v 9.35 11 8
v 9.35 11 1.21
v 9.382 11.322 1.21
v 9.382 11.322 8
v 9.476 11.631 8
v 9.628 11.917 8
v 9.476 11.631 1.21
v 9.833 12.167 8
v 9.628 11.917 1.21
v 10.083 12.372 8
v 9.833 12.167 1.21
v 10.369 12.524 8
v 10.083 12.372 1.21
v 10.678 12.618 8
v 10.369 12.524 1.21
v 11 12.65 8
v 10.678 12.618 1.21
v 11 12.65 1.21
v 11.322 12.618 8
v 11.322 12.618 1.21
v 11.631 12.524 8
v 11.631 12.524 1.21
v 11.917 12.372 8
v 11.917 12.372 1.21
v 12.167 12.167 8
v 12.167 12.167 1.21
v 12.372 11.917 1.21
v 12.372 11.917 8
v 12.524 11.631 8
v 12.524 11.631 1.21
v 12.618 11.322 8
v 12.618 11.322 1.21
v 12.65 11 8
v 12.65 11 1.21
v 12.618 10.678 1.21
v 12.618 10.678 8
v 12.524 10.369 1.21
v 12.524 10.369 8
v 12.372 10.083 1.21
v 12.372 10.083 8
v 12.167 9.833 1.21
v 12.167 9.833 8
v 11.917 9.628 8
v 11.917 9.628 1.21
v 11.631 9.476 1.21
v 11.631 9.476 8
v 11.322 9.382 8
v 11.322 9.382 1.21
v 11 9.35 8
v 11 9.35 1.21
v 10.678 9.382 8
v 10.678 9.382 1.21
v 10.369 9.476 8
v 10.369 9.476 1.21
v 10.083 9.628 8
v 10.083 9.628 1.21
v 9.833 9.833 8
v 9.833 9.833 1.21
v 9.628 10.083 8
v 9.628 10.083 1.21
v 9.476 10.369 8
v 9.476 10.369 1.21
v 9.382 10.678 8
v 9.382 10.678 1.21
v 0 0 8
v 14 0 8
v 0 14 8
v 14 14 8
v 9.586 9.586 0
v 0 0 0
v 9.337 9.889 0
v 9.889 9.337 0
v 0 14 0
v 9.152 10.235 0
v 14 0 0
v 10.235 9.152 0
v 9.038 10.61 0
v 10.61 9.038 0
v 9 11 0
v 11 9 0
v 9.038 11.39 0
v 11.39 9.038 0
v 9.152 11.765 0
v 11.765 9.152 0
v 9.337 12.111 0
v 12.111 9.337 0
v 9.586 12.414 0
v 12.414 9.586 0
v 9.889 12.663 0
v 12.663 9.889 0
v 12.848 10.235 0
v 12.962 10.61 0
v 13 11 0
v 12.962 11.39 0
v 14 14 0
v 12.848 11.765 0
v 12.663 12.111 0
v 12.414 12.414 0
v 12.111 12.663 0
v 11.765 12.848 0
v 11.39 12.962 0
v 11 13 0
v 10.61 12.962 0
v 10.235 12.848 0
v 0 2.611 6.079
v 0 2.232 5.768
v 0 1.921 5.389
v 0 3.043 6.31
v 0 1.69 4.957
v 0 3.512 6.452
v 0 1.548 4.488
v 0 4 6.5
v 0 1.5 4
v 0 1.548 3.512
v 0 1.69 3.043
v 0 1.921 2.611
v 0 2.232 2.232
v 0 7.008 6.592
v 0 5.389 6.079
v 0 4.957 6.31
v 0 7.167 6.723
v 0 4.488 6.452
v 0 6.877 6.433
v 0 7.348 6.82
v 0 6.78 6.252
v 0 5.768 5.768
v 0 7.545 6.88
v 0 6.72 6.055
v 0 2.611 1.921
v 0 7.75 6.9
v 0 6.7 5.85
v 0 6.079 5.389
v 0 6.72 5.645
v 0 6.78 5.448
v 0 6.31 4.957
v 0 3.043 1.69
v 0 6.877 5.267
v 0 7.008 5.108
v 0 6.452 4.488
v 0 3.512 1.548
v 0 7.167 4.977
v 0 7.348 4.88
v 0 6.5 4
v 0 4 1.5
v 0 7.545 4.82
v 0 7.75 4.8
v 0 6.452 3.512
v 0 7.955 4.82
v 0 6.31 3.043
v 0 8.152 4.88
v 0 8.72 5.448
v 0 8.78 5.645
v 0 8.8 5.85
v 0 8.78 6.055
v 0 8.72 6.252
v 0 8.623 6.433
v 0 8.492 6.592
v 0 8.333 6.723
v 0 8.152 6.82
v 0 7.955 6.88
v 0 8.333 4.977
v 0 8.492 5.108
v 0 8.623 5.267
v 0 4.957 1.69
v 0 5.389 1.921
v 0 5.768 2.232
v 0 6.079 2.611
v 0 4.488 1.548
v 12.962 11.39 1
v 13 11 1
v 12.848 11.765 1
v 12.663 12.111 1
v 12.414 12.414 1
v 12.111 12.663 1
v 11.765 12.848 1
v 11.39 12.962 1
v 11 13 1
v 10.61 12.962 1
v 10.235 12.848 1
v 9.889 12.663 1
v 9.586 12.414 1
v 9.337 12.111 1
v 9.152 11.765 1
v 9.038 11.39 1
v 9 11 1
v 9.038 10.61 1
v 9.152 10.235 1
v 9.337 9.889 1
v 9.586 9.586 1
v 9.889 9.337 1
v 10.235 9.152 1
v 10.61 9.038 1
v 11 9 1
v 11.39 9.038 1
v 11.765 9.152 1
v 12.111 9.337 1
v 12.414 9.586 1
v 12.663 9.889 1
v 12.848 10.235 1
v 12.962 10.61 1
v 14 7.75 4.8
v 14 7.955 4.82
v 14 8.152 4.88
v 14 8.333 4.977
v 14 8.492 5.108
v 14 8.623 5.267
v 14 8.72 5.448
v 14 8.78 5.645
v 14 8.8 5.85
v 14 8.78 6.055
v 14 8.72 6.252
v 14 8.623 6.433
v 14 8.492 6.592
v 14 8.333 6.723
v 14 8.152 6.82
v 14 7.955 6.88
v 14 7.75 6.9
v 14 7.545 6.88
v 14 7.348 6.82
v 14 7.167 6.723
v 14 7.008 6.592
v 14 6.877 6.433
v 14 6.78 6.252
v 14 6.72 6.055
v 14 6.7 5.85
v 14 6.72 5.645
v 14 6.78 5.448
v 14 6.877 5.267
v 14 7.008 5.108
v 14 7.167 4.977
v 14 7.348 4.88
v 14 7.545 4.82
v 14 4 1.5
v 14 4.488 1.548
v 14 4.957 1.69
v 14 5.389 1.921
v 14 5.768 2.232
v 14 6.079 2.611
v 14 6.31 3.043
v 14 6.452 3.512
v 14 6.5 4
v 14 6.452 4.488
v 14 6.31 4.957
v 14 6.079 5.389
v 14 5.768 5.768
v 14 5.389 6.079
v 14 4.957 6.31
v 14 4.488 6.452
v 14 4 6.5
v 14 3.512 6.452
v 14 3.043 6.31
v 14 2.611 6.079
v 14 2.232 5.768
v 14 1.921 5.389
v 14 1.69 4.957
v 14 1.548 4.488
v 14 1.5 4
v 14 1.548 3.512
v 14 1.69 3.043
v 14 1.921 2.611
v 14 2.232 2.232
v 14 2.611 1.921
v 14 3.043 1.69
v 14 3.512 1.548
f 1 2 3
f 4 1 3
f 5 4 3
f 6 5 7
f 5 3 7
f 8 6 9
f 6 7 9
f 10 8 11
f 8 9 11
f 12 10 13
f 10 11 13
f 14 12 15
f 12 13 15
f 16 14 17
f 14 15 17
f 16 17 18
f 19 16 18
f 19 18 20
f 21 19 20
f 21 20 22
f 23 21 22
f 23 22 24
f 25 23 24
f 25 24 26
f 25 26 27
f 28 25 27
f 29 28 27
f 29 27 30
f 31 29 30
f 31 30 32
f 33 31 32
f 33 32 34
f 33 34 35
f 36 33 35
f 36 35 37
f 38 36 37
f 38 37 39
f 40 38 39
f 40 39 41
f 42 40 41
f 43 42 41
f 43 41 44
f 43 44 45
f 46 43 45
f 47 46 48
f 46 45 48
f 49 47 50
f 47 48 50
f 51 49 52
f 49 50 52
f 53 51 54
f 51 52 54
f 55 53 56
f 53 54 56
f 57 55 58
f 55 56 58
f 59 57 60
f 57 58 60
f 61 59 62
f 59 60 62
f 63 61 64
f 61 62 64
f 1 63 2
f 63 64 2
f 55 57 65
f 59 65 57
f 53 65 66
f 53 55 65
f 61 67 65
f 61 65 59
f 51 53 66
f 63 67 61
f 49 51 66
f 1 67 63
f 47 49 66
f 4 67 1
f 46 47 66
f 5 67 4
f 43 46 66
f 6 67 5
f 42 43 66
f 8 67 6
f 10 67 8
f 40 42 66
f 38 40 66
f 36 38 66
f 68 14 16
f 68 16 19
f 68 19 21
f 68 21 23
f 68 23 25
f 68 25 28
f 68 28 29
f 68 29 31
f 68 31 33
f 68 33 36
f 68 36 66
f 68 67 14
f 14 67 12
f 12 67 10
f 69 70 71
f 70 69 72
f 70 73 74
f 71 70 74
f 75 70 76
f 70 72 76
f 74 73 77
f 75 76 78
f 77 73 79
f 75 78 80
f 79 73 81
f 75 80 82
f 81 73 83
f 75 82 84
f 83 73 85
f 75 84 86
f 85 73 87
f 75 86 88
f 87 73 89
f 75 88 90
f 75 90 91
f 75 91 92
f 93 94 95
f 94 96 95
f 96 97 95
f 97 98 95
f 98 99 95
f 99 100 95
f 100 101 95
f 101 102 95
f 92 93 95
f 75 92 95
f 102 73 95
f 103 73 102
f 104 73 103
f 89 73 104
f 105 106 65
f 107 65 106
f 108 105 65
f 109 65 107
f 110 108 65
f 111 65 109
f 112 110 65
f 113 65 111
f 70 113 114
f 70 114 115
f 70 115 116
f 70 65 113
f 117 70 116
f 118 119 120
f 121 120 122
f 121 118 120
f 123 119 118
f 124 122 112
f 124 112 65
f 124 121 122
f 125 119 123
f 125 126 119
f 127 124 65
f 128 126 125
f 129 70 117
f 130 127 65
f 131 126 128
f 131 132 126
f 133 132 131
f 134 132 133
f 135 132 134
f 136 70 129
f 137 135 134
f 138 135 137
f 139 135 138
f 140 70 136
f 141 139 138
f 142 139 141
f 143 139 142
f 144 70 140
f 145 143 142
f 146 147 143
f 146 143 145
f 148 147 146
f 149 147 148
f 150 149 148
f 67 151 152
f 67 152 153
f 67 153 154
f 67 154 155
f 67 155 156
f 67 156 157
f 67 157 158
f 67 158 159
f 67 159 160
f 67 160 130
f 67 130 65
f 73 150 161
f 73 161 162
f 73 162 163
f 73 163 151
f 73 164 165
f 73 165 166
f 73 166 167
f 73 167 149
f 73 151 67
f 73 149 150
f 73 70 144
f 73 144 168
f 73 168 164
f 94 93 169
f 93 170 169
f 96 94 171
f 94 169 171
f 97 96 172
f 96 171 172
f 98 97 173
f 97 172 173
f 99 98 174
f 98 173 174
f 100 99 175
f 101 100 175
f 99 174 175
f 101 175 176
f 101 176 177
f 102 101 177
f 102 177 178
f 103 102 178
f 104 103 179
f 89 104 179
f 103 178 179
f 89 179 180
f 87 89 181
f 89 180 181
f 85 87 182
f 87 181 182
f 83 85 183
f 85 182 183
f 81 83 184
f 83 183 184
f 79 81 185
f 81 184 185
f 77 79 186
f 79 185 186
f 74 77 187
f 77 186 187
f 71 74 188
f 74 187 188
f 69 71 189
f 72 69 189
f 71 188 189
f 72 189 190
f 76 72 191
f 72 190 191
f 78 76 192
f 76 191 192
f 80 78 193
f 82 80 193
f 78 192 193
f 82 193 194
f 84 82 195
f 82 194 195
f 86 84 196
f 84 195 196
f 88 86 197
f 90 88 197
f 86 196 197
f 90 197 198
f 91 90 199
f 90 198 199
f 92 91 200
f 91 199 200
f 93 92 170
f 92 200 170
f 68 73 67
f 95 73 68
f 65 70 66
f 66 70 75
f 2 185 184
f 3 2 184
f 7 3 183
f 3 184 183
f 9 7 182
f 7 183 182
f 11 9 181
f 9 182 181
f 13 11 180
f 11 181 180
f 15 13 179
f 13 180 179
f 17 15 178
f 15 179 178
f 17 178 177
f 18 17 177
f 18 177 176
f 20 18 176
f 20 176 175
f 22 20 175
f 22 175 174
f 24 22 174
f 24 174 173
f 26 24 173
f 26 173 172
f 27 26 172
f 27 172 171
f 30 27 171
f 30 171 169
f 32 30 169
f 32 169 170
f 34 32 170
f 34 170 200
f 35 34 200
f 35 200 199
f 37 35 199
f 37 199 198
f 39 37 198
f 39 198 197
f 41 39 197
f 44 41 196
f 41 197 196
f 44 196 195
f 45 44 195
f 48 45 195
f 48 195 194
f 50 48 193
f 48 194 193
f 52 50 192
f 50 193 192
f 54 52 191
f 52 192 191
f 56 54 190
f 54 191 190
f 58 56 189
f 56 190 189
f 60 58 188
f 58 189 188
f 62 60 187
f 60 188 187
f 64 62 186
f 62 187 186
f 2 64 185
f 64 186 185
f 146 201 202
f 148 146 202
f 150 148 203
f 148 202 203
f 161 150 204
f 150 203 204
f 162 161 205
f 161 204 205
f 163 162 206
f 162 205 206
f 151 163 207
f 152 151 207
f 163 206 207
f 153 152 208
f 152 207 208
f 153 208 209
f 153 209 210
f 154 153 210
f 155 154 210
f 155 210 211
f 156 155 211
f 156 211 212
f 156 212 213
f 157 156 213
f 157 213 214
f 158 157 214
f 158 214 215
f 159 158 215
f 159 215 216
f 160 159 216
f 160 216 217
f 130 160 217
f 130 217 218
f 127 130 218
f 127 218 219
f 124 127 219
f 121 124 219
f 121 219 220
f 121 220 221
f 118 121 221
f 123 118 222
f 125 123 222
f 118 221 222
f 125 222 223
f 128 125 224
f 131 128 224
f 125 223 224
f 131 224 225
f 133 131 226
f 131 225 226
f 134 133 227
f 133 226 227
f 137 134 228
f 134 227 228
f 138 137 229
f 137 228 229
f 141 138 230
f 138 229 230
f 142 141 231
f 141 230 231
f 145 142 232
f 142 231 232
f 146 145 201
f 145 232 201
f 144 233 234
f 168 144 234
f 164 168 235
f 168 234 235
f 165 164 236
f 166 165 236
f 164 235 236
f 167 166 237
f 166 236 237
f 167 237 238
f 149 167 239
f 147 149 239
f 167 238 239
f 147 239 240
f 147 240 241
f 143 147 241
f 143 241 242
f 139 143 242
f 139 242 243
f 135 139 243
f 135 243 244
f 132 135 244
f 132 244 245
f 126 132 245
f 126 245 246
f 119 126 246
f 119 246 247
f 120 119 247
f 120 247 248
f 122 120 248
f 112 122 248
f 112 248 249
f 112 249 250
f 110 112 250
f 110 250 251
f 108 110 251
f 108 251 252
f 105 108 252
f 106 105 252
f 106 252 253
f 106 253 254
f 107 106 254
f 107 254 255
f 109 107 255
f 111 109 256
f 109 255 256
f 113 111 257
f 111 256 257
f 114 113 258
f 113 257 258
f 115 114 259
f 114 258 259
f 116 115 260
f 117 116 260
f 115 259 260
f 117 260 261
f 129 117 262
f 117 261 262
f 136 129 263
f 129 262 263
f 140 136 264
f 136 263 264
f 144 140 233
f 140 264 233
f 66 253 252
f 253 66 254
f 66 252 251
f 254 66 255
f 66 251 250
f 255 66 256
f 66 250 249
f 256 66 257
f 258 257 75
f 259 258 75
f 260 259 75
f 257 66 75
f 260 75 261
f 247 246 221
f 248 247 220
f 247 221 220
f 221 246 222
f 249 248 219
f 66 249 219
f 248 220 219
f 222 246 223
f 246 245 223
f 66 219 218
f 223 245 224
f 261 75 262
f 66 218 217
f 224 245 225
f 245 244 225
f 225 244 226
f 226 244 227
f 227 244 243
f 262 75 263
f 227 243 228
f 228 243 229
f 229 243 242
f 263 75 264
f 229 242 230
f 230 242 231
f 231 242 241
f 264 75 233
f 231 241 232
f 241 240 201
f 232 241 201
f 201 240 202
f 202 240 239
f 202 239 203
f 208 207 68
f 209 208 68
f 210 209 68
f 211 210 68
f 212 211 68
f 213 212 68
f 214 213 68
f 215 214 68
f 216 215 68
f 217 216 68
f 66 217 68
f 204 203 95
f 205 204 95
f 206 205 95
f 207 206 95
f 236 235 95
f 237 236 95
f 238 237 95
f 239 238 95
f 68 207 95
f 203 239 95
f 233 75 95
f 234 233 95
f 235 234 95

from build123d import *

# Parameters (mm, degrees)
SKETCH1_W                    = 14
SKETCH1_H                    = 14
BOSS_EXTRUDE1_DEPTH          = 8
M4X0_7_TAPPED_HOLE1_D        = 3.3
F_5_0_5_DIAMETER_HOLE1_D     = 5
F_2_1_2_1_DIAMETER_HOLE1_D   = 2.1
F_4_0_4_DIAMETER_HOLE1_D     = 4
F_4_0_4_DIAMETER_HOLE1_DEPTH = 1
F_4_0_4_DIAMETER_HOLE1_TIP   = 1.201721238


with BuildPart() as part:
    # Sketch1 → Boss-Extrude1 (new body)
    with BuildSketch(Plane.XY):
        with Locations((7, 7)):
            Rectangle(SKETCH1_W, SKETCH1_H)
    extrude(amount=BOSS_EXTRUDE1_DEPTH)

    # M4x0.7 Tapped Hole1 (through all)
    with Locations(Plane.XY.offset(8)):
        with Locations((11, 11)):
            Hole(M4X0_7_TAPPED_HOLE1_D / 2)

    # Ø5.0 (5) Diameter Hole1 (through all)
    with Locations(Plane.ZY):
        with Locations((4, 4)):
            Hole(F_5_0_5_DIAMETER_HOLE1_D / 2)

    # Ø2.1 (2.1) Diameter Hole1 (through all)
    with Locations(Plane.ZY):
        with Locations((5.85, 7.75)):
            Hole(F_2_1_2_1_DIAMETER_HOLE1_D / 2)

    # Ø4.0 (4) Diameter Hole1
    with Locations(Plane(origin=(11, 11, 0), x_dir=(-1, 0, 0), z_dir=(0, 0, -1))):
        with Locations((0, 0)):
            Hole(F_4_0_4_DIAMETER_HOLE1_D / 2, depth=F_4_0_4_DIAMETER_HOLE1_DEPTH)
            with Locations((0, 0, -(F_4_0_4_DIAMETER_HOLE1_DEPTH + F_4_0_4_DIAMETER_HOLE1_TIP / 2))):  # 118° drill point
                Cone(0, F_4_0_4_DIAMETER_HOLE1_D / 2, F_4_0_4_DIAMETER_HOLE1_TIP, mode=Mode.SUBTRACT)


solid = part.part
